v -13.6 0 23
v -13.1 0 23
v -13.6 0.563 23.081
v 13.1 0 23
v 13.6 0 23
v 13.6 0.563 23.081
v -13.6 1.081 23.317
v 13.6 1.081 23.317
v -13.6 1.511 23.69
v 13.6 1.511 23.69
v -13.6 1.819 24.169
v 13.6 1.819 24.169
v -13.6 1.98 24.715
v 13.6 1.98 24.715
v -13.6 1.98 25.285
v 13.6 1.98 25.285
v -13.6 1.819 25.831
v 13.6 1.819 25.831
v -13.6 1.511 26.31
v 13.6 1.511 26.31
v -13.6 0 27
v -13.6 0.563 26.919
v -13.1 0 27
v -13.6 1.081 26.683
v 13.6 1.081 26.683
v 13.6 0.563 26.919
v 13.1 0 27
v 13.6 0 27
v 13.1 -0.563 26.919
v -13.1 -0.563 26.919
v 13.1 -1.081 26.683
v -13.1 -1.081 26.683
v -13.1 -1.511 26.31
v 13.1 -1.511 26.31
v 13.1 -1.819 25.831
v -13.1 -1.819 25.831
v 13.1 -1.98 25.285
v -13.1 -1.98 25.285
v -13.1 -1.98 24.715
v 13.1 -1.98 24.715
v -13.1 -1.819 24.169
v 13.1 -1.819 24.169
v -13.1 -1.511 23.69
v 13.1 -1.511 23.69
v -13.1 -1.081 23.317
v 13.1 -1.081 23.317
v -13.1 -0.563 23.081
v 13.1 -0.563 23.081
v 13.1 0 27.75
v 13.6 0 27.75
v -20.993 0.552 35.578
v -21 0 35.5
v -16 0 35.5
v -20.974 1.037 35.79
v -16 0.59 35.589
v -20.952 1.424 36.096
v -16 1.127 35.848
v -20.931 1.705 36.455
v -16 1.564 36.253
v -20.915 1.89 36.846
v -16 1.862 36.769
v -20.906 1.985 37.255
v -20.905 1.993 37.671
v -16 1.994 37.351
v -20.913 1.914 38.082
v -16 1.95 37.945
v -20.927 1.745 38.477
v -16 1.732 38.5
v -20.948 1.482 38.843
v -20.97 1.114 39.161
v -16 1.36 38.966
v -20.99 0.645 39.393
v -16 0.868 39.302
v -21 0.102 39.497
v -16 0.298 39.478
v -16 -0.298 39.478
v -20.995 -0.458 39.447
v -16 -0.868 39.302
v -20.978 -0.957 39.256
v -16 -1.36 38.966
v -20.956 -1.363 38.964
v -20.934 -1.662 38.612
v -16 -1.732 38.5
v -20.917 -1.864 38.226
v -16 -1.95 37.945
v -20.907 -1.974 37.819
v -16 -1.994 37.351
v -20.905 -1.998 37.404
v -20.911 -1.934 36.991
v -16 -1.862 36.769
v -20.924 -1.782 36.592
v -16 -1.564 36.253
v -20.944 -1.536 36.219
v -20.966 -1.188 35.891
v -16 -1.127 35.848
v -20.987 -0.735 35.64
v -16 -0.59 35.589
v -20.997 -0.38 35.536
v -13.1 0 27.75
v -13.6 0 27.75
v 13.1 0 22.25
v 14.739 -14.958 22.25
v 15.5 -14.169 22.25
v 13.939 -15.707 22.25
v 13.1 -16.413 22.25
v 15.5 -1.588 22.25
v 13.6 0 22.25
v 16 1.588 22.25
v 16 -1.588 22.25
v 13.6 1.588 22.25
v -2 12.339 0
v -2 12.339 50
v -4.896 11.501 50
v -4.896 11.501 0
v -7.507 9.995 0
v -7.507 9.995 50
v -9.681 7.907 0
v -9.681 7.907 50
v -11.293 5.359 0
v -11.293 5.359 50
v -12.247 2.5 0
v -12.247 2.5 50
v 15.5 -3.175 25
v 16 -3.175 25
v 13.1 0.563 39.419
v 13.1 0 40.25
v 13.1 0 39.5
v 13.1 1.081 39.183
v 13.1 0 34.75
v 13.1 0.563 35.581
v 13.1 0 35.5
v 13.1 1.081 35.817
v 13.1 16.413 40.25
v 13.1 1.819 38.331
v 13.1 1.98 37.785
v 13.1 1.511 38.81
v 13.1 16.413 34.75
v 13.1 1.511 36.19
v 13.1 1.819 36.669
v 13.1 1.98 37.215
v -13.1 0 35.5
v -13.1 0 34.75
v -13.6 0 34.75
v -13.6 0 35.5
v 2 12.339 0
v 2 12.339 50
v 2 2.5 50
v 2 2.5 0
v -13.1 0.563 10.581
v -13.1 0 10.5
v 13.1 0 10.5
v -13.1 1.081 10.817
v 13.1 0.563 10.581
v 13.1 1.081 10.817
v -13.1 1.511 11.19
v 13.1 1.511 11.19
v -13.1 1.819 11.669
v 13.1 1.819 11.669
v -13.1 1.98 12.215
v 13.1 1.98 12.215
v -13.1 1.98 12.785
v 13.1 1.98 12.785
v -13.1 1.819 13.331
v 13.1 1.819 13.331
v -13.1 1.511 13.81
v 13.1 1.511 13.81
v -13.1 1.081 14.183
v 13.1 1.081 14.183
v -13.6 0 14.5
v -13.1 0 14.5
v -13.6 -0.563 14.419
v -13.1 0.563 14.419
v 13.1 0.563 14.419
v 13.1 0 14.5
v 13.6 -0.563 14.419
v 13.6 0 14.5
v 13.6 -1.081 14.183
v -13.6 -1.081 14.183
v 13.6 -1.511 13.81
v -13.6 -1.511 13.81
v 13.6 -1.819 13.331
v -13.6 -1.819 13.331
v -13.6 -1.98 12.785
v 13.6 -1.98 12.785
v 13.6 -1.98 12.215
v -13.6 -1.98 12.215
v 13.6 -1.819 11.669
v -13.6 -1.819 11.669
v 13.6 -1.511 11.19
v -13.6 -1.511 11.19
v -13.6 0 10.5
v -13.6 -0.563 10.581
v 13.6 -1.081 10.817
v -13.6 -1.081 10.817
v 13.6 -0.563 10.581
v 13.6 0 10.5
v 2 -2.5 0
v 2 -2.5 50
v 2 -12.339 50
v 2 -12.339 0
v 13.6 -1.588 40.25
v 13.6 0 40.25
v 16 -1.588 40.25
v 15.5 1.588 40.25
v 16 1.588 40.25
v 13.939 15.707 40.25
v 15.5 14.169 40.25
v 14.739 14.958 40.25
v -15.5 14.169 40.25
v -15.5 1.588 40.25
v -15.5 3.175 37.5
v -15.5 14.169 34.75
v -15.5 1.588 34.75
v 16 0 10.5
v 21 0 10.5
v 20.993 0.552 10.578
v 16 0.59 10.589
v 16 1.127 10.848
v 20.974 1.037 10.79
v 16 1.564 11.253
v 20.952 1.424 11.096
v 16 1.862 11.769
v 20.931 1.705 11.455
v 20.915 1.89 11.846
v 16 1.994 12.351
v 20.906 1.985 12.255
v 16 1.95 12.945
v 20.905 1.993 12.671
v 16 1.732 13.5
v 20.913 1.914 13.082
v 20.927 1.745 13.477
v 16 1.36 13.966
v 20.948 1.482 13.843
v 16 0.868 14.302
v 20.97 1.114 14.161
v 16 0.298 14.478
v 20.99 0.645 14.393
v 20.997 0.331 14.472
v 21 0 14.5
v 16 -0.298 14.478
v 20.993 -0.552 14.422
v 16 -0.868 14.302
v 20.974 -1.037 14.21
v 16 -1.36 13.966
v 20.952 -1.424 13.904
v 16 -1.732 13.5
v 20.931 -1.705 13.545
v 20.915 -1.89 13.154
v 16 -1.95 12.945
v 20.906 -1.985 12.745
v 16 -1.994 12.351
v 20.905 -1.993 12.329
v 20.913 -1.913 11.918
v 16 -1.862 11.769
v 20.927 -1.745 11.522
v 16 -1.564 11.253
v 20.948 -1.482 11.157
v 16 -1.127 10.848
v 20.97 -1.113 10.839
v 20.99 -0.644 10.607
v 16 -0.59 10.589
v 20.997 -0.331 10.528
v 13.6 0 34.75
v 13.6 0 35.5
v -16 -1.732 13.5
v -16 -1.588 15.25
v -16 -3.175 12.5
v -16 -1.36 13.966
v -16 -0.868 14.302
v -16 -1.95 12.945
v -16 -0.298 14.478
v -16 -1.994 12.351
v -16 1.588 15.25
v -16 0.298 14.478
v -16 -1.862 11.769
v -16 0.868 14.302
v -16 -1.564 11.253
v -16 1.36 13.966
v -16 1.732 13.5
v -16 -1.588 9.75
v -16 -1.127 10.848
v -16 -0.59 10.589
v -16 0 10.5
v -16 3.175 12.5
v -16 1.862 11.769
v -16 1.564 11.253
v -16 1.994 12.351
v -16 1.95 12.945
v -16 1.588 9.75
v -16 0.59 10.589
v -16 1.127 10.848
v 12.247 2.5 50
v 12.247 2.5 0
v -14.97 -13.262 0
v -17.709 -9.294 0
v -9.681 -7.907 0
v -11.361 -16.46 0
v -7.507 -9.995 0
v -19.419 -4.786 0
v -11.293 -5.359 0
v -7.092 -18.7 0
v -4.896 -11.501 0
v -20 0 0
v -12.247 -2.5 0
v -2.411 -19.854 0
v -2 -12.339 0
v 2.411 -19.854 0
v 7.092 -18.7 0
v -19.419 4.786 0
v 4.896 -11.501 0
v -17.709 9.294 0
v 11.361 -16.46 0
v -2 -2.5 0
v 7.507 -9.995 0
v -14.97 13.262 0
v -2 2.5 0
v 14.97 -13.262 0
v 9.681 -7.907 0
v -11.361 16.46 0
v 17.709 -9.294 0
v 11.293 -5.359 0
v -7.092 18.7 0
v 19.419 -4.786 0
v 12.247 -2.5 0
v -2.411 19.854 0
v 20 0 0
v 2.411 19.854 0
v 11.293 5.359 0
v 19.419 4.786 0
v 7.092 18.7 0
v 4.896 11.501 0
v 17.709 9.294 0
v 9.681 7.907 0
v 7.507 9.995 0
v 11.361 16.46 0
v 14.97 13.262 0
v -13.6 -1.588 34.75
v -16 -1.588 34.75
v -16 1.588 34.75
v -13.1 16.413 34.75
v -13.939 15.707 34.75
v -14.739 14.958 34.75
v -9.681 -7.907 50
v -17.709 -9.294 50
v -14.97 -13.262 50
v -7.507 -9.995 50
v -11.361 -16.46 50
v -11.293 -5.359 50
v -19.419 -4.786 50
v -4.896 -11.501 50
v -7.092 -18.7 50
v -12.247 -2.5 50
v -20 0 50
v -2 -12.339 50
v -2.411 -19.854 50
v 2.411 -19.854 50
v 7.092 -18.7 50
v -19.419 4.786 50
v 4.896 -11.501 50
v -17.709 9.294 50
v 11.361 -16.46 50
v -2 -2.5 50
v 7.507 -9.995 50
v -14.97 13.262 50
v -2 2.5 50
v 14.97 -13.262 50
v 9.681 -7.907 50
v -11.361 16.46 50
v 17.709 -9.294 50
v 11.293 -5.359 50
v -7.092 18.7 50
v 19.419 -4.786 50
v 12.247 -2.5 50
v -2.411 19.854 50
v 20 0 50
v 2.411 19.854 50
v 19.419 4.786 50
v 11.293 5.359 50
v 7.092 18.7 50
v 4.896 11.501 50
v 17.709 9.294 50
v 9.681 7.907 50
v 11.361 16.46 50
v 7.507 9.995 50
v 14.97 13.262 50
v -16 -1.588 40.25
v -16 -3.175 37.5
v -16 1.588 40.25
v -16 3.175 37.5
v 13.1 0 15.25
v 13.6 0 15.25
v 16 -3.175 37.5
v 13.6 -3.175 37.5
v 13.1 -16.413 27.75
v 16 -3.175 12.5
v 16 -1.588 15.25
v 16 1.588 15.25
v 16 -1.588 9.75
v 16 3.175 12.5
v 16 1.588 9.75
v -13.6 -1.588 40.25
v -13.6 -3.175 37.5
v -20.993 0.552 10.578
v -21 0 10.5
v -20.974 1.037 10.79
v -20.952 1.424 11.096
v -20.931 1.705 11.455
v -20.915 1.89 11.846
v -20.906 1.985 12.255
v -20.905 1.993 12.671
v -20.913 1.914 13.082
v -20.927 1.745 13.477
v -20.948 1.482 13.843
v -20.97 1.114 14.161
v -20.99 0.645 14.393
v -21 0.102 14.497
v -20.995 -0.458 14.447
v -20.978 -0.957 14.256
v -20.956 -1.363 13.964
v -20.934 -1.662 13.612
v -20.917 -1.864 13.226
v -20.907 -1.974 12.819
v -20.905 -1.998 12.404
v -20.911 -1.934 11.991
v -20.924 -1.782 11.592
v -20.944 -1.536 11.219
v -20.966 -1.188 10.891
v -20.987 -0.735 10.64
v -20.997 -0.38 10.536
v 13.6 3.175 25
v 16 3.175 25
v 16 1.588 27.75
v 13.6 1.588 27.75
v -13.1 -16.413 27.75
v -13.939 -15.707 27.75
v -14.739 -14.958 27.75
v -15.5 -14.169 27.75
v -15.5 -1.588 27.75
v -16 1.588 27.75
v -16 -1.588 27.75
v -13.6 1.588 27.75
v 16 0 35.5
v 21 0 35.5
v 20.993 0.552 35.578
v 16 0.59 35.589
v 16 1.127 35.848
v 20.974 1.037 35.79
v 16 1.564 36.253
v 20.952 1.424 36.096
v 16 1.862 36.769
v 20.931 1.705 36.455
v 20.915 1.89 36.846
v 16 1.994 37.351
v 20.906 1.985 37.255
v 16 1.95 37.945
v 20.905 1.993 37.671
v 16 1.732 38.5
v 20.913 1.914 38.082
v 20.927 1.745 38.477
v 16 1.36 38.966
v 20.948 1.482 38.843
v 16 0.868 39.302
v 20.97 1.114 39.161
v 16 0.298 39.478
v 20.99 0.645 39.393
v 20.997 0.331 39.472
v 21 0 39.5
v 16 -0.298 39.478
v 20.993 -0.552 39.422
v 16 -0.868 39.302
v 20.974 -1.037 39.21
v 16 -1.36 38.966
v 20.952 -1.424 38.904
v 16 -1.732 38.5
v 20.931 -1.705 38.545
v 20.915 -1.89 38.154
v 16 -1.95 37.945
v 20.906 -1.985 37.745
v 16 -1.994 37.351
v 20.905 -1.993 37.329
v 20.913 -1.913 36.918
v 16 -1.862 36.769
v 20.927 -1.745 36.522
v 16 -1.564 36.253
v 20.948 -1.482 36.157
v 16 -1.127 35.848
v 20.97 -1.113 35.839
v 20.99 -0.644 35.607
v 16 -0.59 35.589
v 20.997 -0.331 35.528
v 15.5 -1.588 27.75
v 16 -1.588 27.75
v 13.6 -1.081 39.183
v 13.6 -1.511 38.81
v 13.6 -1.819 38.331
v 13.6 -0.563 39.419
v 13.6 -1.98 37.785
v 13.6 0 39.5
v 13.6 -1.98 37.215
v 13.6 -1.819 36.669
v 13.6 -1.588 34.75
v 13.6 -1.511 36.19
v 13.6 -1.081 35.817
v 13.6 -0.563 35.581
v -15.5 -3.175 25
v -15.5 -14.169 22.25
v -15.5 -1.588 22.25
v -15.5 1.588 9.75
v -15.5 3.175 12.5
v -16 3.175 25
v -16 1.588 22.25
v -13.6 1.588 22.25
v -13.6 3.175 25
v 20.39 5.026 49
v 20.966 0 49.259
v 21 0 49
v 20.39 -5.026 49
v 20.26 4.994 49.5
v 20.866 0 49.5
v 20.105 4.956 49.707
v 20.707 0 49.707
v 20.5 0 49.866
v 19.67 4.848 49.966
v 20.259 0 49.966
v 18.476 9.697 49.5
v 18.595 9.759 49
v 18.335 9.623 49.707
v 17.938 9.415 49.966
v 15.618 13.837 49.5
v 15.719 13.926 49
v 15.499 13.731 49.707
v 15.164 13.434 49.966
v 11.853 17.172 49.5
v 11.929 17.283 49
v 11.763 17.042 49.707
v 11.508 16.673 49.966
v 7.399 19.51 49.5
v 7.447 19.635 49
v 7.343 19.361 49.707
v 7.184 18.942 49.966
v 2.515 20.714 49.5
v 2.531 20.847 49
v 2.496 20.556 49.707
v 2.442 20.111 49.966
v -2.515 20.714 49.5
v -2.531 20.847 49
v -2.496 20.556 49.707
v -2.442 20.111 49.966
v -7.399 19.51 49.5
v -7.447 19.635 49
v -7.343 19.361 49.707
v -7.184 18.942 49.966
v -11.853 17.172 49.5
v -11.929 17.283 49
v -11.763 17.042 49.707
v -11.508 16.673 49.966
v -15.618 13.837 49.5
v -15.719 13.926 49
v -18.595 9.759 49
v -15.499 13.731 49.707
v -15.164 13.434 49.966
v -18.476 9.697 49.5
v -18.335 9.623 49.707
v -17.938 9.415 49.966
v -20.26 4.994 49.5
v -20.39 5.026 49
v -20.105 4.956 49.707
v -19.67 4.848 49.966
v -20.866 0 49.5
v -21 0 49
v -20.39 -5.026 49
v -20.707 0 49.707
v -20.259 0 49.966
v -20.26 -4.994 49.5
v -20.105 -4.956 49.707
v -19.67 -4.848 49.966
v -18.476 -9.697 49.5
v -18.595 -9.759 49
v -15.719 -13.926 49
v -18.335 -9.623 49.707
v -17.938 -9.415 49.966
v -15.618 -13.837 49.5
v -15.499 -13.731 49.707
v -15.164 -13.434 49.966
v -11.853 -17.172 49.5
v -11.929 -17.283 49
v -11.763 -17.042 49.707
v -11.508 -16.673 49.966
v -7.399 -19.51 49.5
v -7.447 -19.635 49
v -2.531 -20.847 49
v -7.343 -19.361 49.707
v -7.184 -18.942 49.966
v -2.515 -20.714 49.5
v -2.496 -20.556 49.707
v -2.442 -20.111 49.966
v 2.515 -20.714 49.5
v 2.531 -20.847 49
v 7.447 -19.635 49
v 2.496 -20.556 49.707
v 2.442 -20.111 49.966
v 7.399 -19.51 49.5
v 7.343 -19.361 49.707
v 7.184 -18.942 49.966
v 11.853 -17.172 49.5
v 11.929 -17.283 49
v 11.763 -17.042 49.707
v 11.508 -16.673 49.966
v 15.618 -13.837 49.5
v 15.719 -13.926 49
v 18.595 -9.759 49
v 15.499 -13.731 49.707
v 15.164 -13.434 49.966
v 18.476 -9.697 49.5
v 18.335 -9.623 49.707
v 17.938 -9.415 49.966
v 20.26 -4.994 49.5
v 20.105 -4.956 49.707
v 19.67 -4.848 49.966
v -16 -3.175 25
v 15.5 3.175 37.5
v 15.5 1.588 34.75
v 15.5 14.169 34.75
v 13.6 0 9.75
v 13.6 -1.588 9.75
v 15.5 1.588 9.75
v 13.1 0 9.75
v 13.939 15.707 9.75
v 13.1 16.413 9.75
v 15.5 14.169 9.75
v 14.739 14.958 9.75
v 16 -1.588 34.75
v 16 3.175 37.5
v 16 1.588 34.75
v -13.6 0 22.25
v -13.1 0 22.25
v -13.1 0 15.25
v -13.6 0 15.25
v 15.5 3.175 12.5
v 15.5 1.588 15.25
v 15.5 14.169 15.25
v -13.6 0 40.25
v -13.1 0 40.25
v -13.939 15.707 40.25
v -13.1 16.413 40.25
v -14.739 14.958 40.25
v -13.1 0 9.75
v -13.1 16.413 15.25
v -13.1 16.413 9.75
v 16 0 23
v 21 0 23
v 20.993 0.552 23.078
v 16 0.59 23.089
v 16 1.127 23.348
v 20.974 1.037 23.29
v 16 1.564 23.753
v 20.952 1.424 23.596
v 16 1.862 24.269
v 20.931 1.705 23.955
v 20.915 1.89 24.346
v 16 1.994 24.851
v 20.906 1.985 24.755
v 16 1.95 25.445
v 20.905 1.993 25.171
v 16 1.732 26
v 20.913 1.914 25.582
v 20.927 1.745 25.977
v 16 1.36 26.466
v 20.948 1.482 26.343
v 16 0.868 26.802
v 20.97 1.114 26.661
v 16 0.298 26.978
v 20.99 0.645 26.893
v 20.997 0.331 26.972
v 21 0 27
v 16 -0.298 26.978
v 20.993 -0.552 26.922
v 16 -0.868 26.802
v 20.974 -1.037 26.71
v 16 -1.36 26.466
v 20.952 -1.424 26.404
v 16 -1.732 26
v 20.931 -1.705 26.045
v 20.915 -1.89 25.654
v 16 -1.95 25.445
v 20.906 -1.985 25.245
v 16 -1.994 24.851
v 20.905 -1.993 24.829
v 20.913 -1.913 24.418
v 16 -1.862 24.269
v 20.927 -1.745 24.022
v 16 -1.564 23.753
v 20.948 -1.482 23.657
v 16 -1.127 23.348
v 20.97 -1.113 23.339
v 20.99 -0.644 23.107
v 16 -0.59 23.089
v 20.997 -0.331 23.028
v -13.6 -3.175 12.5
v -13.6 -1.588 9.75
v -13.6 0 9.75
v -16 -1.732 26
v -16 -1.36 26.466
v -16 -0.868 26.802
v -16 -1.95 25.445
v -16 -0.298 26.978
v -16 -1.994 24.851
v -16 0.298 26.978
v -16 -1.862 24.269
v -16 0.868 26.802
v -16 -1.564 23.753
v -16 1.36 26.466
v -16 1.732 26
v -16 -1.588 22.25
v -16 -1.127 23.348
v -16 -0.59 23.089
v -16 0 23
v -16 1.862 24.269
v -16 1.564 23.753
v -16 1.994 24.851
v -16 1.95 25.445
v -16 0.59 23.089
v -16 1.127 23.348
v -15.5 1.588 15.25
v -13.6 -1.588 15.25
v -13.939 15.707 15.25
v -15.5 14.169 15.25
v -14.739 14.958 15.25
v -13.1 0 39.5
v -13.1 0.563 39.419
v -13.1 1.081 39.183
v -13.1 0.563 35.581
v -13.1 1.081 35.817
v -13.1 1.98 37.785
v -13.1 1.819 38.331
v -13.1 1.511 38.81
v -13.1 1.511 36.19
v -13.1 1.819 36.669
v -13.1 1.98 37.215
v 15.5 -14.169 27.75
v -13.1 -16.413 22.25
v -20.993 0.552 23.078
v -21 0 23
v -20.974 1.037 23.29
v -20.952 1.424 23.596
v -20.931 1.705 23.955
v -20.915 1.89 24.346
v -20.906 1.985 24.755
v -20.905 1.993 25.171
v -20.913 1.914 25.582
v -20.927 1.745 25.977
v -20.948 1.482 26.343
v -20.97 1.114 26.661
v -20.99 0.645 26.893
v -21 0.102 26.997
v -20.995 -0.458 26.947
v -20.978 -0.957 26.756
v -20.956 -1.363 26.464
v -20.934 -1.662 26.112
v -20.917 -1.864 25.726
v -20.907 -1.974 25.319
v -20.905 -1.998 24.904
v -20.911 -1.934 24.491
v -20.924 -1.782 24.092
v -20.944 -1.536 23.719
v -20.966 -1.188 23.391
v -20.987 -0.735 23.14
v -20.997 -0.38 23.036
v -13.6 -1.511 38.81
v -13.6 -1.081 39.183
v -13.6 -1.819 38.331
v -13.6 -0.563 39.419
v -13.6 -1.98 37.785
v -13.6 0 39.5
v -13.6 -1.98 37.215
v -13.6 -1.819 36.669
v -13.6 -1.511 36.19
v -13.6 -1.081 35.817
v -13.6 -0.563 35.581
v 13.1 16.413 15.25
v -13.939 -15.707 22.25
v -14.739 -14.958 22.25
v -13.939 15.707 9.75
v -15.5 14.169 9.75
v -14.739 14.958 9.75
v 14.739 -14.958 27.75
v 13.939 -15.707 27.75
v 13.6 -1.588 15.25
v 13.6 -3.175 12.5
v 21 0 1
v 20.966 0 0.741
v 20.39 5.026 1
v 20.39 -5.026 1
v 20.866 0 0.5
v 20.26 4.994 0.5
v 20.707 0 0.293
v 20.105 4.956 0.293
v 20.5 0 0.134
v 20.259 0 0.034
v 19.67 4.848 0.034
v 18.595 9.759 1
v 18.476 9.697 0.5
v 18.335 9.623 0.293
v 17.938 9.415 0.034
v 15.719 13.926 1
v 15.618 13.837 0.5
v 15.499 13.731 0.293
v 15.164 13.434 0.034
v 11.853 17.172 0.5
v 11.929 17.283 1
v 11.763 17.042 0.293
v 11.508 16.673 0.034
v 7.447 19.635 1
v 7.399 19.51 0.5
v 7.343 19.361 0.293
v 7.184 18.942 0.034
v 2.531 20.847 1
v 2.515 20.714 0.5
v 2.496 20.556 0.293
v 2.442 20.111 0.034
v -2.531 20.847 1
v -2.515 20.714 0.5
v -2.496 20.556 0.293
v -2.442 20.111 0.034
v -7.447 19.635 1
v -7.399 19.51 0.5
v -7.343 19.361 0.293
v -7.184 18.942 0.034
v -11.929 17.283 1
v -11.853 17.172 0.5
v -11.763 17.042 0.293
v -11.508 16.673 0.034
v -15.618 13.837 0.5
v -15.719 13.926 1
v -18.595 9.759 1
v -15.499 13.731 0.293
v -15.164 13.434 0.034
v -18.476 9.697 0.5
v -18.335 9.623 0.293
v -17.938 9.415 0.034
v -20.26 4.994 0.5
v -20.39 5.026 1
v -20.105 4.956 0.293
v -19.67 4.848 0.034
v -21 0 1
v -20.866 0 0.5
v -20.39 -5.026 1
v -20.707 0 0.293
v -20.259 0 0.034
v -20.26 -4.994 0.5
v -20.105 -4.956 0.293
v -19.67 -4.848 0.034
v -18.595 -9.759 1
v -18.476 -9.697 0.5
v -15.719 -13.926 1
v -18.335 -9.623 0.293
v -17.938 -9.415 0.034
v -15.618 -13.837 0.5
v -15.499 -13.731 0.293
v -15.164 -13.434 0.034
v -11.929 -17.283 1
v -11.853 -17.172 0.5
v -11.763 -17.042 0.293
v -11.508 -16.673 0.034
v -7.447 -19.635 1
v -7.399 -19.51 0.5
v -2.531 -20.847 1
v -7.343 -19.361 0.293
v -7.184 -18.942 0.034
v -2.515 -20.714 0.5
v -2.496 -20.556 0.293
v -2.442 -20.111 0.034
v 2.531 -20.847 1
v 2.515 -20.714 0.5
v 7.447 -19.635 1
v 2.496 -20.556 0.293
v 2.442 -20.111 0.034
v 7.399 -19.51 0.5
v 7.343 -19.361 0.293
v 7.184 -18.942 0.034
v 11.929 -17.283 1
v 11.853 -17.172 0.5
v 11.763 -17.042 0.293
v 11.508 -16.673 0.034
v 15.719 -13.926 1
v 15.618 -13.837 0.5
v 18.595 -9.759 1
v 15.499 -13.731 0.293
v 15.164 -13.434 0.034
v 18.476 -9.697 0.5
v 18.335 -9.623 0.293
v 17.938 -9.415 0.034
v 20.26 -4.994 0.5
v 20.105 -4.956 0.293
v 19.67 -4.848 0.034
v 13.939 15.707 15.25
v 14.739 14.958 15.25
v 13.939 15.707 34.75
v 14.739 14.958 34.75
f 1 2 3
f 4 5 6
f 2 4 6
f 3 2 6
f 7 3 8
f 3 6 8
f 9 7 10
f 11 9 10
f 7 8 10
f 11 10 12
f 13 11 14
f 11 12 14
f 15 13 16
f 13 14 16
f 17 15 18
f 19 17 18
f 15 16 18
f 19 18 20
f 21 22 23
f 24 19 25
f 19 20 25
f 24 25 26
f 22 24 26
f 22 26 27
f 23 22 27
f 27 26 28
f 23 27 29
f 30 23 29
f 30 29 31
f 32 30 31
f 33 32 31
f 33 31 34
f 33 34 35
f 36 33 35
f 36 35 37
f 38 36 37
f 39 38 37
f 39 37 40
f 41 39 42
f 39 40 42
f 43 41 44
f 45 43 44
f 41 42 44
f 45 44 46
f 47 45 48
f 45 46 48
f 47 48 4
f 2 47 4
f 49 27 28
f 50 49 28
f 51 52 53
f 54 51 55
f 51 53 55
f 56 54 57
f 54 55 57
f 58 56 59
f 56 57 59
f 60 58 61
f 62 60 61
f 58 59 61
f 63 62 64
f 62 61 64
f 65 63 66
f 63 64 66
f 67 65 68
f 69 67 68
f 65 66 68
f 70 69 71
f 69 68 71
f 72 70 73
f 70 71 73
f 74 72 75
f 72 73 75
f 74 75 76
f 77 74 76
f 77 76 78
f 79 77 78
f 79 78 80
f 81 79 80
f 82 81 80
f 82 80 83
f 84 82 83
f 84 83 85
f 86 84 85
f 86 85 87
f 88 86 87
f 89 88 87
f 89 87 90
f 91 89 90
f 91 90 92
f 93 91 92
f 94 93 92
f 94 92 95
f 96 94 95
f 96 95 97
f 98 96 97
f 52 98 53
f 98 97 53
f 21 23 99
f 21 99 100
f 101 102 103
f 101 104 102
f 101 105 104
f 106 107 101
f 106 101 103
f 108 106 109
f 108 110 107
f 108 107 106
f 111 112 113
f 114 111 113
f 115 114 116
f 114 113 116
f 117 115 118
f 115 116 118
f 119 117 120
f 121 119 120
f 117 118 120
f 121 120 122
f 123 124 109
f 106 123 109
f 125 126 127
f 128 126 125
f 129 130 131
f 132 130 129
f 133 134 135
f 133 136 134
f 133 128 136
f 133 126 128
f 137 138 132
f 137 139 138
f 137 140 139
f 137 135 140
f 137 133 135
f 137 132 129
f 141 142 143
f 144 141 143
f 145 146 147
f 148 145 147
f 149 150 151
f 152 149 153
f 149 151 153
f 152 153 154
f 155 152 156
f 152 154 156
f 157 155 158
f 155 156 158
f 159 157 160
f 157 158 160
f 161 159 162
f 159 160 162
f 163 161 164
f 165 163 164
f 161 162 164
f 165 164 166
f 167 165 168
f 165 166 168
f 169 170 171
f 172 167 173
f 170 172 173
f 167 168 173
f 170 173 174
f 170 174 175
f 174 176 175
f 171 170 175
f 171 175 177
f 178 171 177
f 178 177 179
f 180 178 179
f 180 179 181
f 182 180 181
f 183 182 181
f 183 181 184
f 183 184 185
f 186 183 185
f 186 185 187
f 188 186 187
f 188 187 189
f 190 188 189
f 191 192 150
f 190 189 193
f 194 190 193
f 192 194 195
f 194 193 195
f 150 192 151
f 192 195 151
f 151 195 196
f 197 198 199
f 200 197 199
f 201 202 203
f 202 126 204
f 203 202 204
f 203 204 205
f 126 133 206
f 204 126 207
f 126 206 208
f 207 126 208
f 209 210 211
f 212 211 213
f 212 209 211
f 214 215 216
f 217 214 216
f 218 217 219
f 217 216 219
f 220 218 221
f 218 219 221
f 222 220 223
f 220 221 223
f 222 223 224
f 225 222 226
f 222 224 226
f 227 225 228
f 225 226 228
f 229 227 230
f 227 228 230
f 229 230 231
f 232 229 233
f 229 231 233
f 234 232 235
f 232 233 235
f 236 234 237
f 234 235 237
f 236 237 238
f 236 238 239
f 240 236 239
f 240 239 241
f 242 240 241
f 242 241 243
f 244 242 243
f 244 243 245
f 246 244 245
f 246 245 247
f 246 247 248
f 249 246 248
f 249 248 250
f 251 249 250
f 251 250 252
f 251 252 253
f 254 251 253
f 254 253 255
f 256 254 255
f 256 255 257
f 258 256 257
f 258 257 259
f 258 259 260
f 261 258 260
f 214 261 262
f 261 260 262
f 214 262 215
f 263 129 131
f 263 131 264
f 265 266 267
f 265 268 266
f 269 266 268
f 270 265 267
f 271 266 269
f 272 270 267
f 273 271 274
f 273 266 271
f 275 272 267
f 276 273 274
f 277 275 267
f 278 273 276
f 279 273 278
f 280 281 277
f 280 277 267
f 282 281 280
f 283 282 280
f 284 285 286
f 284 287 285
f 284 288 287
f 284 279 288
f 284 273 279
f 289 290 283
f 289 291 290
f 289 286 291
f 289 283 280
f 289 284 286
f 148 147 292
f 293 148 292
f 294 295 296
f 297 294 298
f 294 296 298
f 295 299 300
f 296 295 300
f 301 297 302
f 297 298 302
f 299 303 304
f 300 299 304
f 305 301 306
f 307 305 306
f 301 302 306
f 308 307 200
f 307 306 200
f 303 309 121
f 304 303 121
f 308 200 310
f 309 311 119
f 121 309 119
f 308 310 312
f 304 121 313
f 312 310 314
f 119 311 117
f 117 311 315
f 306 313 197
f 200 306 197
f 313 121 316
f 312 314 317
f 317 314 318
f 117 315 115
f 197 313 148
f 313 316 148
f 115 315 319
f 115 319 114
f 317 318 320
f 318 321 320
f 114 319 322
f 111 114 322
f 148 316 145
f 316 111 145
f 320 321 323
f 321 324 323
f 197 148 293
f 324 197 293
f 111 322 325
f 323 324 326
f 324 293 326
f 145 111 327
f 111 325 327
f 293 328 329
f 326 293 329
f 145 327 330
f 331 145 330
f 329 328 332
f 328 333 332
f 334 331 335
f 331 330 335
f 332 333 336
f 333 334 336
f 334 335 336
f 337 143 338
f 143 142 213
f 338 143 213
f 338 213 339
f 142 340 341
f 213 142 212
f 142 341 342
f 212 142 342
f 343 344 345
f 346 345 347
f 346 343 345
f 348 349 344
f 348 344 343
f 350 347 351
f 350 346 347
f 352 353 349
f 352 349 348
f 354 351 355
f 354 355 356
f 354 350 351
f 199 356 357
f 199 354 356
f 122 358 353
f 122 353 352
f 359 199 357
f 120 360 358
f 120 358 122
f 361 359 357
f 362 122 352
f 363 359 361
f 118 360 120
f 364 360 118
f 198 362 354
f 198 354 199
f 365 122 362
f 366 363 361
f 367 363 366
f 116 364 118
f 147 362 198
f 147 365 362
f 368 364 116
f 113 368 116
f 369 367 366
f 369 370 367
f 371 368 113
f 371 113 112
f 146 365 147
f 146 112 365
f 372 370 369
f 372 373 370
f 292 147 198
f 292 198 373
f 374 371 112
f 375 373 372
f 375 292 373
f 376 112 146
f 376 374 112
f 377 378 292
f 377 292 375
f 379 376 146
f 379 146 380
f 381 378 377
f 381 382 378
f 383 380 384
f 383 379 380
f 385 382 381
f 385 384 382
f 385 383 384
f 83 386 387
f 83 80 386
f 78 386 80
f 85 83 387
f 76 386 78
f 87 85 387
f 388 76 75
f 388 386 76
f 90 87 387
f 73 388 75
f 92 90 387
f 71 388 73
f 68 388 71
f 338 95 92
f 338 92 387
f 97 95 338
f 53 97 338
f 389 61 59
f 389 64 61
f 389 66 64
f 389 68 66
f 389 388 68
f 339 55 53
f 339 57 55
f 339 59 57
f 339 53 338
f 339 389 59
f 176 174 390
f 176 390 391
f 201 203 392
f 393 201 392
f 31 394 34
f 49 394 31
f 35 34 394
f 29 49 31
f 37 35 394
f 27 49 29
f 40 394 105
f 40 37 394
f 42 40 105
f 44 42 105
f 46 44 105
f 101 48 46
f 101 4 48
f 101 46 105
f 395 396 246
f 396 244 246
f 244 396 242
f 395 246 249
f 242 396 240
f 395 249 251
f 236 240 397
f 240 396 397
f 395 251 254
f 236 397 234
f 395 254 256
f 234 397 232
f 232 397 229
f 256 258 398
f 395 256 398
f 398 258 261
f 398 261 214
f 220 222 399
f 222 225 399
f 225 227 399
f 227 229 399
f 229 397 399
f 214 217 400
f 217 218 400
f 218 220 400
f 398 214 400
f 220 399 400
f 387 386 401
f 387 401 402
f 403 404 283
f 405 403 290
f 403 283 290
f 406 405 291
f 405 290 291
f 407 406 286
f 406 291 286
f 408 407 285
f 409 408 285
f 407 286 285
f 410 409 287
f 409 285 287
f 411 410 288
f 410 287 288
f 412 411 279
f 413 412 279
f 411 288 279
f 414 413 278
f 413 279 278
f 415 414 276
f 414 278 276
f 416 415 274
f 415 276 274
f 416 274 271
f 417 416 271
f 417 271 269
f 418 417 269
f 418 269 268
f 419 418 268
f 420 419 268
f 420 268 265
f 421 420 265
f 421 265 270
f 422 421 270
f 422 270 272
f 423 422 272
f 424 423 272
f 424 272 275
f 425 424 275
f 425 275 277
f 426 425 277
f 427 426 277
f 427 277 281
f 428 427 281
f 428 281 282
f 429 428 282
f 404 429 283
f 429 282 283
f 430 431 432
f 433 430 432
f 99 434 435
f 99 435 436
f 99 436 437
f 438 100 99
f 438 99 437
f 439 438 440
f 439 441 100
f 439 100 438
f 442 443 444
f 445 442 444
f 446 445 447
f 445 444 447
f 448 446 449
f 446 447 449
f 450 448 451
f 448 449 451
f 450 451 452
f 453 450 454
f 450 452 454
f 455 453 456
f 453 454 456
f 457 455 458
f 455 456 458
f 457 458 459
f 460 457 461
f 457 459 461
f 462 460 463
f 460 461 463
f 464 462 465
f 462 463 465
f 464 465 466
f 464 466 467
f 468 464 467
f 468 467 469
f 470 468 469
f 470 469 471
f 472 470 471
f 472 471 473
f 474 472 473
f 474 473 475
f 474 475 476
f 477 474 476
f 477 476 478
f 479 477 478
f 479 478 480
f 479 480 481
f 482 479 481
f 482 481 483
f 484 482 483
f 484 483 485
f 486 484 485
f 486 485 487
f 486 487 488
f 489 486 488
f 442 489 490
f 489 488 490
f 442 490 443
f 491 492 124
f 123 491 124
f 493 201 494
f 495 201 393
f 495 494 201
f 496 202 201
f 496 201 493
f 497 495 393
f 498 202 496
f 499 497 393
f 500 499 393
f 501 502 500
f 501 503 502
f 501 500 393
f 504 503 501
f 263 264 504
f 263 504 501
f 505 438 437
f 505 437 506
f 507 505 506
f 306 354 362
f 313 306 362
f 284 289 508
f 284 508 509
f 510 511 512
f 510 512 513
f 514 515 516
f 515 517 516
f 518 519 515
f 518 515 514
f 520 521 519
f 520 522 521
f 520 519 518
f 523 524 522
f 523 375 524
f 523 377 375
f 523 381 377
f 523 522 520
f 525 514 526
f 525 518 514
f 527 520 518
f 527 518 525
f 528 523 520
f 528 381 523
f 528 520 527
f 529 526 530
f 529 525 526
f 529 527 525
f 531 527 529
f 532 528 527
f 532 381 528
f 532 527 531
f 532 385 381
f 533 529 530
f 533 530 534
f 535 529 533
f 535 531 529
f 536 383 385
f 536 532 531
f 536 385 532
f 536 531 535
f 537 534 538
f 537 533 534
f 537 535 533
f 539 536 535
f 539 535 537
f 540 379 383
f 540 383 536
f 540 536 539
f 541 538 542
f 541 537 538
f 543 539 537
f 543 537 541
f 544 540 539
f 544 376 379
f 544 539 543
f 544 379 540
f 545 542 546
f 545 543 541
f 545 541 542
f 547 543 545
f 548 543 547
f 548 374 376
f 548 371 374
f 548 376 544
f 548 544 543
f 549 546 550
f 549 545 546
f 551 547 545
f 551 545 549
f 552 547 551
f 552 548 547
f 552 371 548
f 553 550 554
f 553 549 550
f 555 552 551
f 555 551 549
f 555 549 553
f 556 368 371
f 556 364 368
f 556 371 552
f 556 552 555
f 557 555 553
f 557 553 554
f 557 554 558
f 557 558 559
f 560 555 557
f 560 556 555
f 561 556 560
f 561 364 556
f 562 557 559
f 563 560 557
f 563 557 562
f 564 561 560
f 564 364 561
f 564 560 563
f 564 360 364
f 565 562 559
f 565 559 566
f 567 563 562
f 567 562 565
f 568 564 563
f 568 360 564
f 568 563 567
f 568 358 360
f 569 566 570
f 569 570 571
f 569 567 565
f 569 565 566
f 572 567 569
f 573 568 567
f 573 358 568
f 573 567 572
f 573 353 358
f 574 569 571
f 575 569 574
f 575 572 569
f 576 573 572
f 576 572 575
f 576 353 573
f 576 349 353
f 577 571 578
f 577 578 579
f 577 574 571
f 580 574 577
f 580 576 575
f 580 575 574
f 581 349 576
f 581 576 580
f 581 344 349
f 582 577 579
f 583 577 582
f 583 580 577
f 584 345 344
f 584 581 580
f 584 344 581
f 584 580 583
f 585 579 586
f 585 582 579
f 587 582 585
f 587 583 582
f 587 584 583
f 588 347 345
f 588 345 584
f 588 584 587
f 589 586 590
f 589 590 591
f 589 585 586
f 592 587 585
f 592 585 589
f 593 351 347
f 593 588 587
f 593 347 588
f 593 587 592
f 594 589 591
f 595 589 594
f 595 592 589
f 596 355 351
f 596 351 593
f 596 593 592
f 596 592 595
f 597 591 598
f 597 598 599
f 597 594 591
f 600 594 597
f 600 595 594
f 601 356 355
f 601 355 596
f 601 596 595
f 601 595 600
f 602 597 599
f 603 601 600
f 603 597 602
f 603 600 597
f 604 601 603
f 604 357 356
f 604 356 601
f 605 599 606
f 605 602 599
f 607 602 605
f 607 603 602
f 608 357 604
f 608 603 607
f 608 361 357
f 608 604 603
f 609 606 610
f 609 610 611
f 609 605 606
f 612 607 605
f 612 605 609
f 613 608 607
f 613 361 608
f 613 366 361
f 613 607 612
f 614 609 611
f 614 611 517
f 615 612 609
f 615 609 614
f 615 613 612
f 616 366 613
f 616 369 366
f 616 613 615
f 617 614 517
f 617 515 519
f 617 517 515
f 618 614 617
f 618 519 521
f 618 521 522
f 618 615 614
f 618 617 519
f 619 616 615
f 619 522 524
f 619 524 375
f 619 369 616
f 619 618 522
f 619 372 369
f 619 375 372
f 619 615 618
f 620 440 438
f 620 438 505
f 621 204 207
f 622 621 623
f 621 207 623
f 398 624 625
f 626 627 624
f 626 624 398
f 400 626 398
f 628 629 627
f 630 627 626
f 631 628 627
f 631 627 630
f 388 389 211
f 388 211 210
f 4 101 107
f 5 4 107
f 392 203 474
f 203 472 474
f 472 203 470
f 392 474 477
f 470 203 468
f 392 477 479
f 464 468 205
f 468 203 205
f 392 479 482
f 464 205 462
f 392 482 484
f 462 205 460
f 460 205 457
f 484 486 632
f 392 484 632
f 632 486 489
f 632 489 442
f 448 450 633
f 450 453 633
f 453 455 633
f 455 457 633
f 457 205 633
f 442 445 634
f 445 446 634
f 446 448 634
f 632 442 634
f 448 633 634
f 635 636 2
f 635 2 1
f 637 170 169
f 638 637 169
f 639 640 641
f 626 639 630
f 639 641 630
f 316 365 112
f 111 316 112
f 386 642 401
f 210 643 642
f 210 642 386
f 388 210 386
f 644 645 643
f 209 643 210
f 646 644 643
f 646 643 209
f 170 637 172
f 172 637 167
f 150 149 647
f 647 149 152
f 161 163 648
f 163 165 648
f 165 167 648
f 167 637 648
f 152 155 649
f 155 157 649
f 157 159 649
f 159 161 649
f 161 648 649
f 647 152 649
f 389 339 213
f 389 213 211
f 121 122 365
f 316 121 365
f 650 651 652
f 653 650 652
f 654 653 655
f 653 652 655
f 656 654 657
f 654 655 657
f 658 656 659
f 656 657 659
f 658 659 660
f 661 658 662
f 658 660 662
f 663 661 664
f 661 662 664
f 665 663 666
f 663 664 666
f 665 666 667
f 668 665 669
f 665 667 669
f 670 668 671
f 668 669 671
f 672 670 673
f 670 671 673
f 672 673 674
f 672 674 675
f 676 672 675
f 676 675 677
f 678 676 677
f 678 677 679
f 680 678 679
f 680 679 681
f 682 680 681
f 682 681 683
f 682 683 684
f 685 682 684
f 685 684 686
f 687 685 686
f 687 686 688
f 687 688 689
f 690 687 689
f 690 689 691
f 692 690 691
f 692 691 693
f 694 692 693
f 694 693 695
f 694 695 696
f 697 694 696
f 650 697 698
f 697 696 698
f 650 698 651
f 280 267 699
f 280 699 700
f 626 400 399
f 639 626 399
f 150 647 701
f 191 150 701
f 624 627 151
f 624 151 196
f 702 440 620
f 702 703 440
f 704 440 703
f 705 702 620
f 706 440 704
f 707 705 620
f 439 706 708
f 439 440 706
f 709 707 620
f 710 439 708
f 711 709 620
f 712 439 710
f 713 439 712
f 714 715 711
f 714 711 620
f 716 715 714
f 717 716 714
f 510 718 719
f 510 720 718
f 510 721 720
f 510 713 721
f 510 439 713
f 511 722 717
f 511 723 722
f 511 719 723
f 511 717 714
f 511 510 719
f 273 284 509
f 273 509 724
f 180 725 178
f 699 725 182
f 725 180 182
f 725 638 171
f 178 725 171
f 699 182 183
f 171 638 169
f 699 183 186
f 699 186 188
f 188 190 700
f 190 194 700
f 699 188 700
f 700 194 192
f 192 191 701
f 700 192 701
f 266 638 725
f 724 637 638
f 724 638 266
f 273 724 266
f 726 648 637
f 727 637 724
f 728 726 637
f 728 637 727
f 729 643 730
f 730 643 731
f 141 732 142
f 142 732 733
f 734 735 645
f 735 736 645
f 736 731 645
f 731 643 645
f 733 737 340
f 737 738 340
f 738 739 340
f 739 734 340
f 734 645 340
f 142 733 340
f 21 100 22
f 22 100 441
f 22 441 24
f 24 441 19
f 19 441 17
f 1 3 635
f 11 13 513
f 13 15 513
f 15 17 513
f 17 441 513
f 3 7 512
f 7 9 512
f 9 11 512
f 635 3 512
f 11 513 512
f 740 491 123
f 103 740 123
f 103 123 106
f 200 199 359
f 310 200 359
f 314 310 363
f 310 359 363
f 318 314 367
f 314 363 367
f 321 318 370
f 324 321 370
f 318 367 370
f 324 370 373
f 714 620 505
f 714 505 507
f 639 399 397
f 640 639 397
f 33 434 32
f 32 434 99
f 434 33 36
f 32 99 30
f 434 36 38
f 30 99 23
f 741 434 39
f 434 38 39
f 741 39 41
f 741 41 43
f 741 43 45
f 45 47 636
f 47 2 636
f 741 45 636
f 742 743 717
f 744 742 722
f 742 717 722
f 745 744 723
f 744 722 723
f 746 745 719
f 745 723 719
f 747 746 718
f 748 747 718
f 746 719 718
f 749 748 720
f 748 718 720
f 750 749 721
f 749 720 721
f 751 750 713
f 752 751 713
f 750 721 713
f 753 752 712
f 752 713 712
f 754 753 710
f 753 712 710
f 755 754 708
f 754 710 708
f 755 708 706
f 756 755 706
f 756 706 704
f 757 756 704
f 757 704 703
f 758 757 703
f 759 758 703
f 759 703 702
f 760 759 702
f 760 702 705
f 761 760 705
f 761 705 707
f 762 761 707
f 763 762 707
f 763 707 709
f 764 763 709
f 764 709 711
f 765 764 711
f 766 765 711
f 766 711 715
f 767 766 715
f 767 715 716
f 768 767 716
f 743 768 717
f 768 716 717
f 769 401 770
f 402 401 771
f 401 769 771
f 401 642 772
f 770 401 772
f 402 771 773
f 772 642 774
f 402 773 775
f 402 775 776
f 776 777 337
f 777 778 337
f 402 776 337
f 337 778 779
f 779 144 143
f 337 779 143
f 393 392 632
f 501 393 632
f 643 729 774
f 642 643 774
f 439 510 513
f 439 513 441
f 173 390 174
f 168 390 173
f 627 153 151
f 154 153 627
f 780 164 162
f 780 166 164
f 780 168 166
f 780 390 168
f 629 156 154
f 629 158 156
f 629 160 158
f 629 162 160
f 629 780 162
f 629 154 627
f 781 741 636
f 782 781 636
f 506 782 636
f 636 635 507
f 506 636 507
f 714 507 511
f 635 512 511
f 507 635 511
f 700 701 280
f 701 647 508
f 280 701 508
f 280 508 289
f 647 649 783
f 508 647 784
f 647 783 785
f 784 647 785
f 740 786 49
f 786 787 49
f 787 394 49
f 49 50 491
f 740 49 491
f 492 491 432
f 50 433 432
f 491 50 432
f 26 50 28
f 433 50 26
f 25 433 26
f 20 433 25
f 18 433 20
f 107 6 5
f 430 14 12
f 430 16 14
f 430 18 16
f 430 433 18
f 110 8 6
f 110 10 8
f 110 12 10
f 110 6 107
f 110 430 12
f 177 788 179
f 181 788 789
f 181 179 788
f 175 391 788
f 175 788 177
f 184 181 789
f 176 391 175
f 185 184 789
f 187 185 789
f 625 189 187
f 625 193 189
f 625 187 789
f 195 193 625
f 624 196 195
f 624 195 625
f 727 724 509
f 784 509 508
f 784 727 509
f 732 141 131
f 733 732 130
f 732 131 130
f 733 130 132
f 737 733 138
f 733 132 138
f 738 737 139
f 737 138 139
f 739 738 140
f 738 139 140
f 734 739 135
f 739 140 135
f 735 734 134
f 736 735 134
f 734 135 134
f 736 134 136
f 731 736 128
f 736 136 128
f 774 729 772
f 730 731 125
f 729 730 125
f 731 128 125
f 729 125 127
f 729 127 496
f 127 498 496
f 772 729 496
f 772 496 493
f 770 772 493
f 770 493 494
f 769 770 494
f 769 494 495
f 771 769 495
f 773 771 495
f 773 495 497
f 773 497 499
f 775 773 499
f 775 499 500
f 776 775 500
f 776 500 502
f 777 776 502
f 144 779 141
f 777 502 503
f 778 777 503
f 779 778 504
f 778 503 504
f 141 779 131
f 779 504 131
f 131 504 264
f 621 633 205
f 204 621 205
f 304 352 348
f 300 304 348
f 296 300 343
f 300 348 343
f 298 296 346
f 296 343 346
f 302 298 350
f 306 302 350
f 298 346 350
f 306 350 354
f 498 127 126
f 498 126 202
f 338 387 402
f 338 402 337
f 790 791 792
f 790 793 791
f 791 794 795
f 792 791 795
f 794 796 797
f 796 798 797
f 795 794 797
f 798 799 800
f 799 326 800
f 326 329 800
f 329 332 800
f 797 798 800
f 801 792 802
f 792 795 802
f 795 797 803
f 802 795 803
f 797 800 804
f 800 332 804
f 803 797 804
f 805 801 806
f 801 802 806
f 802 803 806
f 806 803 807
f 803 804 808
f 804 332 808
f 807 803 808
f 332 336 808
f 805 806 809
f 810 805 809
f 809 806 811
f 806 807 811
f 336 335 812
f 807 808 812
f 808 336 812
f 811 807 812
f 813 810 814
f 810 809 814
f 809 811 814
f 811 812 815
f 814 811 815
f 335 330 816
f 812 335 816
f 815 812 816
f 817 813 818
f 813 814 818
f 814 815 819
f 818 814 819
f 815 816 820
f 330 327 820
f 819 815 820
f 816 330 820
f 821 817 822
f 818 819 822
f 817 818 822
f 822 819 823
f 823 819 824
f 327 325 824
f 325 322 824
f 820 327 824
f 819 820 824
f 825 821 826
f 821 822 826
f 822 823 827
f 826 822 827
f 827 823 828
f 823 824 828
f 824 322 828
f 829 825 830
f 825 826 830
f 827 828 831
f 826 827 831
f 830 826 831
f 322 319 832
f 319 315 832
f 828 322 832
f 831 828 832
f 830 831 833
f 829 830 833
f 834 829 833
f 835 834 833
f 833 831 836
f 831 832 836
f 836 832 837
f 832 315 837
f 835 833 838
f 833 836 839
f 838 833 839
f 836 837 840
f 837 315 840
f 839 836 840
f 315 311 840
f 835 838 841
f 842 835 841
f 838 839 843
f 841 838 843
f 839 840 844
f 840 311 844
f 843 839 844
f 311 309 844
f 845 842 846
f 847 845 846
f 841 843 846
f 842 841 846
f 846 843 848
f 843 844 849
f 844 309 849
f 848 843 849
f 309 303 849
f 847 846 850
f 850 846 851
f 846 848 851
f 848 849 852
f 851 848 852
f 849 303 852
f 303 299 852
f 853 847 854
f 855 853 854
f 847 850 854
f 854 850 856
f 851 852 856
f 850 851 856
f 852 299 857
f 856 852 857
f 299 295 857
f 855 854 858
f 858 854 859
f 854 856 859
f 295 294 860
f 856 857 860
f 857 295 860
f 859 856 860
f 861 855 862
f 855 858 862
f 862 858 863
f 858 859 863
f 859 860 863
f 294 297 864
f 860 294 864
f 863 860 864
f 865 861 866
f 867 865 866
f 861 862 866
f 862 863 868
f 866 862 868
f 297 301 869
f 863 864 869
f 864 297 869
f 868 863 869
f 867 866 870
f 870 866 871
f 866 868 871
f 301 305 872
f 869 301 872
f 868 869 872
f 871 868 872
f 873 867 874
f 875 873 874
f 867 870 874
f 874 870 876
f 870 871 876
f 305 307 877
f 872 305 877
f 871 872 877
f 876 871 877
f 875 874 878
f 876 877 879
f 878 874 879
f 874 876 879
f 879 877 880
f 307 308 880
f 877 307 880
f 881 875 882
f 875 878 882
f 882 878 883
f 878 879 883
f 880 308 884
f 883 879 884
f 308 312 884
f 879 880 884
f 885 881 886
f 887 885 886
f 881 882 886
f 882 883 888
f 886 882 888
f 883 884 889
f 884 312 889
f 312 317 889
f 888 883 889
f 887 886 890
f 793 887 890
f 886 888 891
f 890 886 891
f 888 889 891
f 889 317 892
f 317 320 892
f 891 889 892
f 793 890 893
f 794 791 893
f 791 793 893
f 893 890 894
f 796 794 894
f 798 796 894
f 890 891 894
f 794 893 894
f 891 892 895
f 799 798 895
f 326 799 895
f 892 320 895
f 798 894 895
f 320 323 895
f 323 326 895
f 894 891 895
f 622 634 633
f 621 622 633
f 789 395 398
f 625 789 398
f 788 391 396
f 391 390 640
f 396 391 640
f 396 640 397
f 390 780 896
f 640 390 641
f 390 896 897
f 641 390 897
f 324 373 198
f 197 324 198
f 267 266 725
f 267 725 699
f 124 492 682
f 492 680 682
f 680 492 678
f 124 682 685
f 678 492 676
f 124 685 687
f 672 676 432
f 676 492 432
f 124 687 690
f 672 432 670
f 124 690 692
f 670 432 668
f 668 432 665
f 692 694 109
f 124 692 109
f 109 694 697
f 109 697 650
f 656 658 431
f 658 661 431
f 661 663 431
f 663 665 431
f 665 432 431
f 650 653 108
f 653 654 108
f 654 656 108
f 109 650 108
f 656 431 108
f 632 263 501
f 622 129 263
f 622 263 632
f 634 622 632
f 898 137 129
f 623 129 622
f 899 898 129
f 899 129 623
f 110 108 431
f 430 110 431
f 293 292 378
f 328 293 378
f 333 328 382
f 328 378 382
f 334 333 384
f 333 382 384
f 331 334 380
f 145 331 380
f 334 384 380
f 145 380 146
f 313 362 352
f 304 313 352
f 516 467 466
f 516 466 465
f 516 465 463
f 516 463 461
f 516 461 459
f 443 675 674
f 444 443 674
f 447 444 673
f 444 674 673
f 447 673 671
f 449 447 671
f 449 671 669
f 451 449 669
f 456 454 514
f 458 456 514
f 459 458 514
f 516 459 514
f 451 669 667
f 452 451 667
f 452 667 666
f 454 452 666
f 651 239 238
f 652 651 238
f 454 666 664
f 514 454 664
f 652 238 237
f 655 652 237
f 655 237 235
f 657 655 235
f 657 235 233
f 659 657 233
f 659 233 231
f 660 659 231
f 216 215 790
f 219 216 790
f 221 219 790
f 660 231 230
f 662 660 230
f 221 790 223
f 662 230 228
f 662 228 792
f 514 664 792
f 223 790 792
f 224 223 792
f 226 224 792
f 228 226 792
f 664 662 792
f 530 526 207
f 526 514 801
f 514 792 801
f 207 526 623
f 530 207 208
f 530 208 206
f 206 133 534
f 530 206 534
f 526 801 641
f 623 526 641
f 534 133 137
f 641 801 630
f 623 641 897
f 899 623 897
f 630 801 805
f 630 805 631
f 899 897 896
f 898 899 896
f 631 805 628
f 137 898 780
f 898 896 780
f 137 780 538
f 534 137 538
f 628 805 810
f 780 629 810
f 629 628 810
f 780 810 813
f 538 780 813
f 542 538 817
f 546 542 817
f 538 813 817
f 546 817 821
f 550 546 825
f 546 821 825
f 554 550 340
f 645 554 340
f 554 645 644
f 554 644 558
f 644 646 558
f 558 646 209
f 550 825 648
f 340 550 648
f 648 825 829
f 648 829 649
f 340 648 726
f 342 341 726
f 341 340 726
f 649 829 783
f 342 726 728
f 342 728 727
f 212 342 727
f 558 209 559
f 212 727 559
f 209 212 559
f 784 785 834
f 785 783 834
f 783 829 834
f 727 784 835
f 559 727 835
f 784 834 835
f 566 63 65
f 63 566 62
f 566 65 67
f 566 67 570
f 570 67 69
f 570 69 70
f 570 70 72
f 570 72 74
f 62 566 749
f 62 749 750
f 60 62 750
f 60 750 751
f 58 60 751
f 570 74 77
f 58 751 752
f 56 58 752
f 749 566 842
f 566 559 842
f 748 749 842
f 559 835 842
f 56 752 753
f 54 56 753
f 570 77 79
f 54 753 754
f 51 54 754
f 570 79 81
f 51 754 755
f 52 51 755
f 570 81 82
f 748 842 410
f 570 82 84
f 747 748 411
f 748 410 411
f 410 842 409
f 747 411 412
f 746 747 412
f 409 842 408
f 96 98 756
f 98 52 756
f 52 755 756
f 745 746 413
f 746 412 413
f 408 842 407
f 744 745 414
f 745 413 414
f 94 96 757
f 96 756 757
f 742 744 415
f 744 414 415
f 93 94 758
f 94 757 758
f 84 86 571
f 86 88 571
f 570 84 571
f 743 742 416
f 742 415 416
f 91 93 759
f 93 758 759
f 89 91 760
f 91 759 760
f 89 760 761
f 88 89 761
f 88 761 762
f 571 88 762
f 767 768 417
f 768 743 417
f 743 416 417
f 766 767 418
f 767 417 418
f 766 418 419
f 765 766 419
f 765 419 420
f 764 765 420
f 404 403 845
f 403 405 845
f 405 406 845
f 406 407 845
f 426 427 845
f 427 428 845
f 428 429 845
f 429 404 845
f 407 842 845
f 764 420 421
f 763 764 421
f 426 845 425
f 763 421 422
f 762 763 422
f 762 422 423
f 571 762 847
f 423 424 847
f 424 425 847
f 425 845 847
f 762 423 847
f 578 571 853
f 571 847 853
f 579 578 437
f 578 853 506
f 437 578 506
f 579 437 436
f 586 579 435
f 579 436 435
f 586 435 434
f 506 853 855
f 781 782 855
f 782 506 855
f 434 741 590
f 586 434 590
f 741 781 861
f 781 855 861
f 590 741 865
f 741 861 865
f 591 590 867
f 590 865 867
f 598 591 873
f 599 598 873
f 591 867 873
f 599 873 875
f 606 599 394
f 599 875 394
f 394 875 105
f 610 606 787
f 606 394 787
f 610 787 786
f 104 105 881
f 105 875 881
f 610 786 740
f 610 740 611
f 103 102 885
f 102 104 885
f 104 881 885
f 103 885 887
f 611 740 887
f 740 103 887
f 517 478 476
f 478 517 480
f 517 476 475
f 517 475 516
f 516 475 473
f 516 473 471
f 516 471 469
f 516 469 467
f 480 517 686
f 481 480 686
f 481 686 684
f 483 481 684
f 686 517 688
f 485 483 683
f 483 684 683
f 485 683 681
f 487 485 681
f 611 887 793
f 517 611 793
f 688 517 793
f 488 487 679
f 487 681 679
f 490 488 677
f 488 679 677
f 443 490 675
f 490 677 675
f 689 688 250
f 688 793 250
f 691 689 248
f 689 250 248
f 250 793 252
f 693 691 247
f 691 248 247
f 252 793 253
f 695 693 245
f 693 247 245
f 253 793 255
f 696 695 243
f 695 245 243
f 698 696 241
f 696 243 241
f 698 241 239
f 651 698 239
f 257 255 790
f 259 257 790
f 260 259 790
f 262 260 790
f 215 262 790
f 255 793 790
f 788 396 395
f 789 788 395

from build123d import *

# Parameters (mm, degrees)
SKETCH_1_R           = 21
EXTRUDE_1_DEPTH      = 50
FILLET_1_R           = 1
FILLET_2_R           = 1
SKETCH_2_R           = 2
CUT_EXTRUDE_1_DEPTH  = 43
CUT_EXTRUDE_START    = -5
CUT_EXTRUDE_2_DEPTH  = 2.4
CUT_EXTRUDE_9_DEPTH  = 51
SKETCH_6_W           = 2.4
SKETCH_6_H           = 5.5
CUT_EXTRUDE_10_DEPTH = 21
CUT_EXTRUDE_START_2  = -21
SKETCH_6_5_W         = 2.4
SKETCH_6_5_H         = 5.5
CUT_EXTRUDE_11_DEPTH = 21


with BuildPart() as part:
    # Эскиз1 → Бобышка-Вытянуть1 (new body)
    with BuildSketch(Plane.XY):
        Circle(SKETCH_1_R)
    extrude(amount=EXTRUDE_1_DEPTH)

    # Скругление1
    fillet_1_edges = [part.edges().sort_by_distance(p)[0] for p in [
        (-21, 0, 50),
    ]]
    fillet(fillet_1_edges, radius=FILLET_1_R)

    # Скругление2
    fillet_2_edges = [part.edges().sort_by_distance(p)[0] for p in [
        (-21, 0, 0),
    ]]
    fillet(fillet_2_edges, radius=FILLET_2_R)

    # Эскиз2 → Вырез-Вытянуть1 (cut, through all)
    with BuildSketch(Plane(origin=(21, 0, 0), x_dir=(0, 0, -1), z_dir=(1, 0, 0))):
        with Locations((-37.5, 0)):
            Circle(SKETCH_2_R)
        with Locations((-25, 0)):
            Circle(SKETCH_2_R)
        with Locations((-12.5, 0)):
            Circle(SKETCH_2_R)
    extrude(amount=-CUT_EXTRUDE_1_DEPTH, mode=Mode.SUBTRACT)

    # Эскиз3 → Вырез-Вытянуть2 (cut)
    with BuildSketch(Plane(origin=(21, 0, 0), x_dir=(0, 0, -1), z_dir=(1, 0, 0)).offset(CUT_EXTRUDE_START)):
        Polygon((-25, 3.175426481), (-27.75, 1.58771324), (-27.75, -1.58771324), (-25, -3.175426481), (-22.25, -1.58771324), (-22.25, 1.58771324), align=None)
        Polygon((-37.5, 3.175426481), (-40.25, 1.58771324), (-40.25, -1.58771324), (-37.5, -3.175426481), (-34.75, -1.58771324), (-34.75, 1.58771324), align=None)
        Polygon((-12.5, 3.175426481), (-15.25, 1.58771324), (-15.25, -1.58771324), (-12.5, -3.175426481), (-9.75, -1.58771324), (-9.75, 1.58771324), align=None)
    cut_extrude_2 = extrude(amount=-CUT_EXTRUDE_2_DEPTH, mode=Mode.SUBTRACT)

    # Зеркальное отражение1: Вырез-Вытянуть2 across plane
    add(cut_extrude_2.mirror(Plane(origin=(0, 0, 0), x_dir=(0, 0, 1), z_dir=(1, 0, 0))), mode=Mode.SUBTRACT)

    # Эскиз4 → Вырез-Вытянуть9 (cut, through all)
    with BuildSketch(Plane.XY.offset(50)):
        with BuildLine():
            Line((-2, 2.5), (-2, 12.338962679))
            ThreePointArc((-2, 12.338962679), (-8.657294344, 9.016720836), (-12.247448714, 2.5))
            Line((-12.247448714, 2.5), (-2, 2.5))
        make_face()
        with BuildLine():
            Line((2, 12.338962679), (2, 2.5))
            Line((2, 2.5), (12.247448714, 2.5))
            ThreePointArc((12.247448714, 2.5), (8.657294344, 9.016720836), (2, 12.338962679))
        make_face()
        with BuildLine():
            ThreePointArc((2, -12.338962679), (8.657294344, -9.016720836), (12.247448714, -2.5))
            Line((12.247448714, -2.5), (2, -2.5))
            Line((2, -2.5), (2, -12.338962679))
        make_face()
        with BuildLine():
            Line((-2, -2.5), (-12.247448714, -2.5))
            ThreePointArc((-12.247448714, -2.5), (-8.657294344, -9.016720836), (-2, -12.338962679))
            Line((-2, -12.338962679), (-2, -2.5))
        make_face()
    extrude(amount=-CUT_EXTRUDE_9_DEPTH, mode=Mode.SUBTRACT)

    # Эскиз6 → Вырез-Вытянуть10 (cut)
    with BuildSketch(Plane(origin=(0, 21, 0), x_dir=(1, 0, 0), z_dir=(0, 1, 0))):
        with Locations((14.3, -37.5)):
            Rectangle(SKETCH_6_W, SKETCH_6_H)
        with Locations((14.3, -12.5)):
            Rectangle(SKETCH_6_W, SKETCH_6_H)
    cut_extrude_10 = extrude(amount=-CUT_EXTRUDE_10_DEPTH, mode=Mode.SUBTRACT)

    # Эскиз6<5> → Вырез-Вытянуть11 (cut)
    with BuildSketch(Plane(origin=(0, 21, 0), x_dir=(1, 0, 0), z_dir=(0, 1, 0)).offset(CUT_EXTRUDE_START_2)):
        with Locations((14.3, -25)):
            Rectangle(SKETCH_6_5_W, SKETCH_6_5_H)
    cut_extrude_11 = extrude(amount=-CUT_EXTRUDE_11_DEPTH, mode=Mode.SUBTRACT)

    # Зеркальное отражение2: Вырез-Вытянуть10, Вырез-Вытянуть11 across plane
    add(cut_extrude_10.mirror(Plane(origin=(0, 0, 0), x_dir=(0, 0, 1), z_dir=(1, 0, 0))), mode=Mode.SUBTRACT)
    add(cut_extrude_11.mirror(Plane(origin=(0, 0, 0), x_dir=(0, 0, 1), z_dir=(1, 0, 0))), mode=Mode.SUBTRACT)


solid = part.part
